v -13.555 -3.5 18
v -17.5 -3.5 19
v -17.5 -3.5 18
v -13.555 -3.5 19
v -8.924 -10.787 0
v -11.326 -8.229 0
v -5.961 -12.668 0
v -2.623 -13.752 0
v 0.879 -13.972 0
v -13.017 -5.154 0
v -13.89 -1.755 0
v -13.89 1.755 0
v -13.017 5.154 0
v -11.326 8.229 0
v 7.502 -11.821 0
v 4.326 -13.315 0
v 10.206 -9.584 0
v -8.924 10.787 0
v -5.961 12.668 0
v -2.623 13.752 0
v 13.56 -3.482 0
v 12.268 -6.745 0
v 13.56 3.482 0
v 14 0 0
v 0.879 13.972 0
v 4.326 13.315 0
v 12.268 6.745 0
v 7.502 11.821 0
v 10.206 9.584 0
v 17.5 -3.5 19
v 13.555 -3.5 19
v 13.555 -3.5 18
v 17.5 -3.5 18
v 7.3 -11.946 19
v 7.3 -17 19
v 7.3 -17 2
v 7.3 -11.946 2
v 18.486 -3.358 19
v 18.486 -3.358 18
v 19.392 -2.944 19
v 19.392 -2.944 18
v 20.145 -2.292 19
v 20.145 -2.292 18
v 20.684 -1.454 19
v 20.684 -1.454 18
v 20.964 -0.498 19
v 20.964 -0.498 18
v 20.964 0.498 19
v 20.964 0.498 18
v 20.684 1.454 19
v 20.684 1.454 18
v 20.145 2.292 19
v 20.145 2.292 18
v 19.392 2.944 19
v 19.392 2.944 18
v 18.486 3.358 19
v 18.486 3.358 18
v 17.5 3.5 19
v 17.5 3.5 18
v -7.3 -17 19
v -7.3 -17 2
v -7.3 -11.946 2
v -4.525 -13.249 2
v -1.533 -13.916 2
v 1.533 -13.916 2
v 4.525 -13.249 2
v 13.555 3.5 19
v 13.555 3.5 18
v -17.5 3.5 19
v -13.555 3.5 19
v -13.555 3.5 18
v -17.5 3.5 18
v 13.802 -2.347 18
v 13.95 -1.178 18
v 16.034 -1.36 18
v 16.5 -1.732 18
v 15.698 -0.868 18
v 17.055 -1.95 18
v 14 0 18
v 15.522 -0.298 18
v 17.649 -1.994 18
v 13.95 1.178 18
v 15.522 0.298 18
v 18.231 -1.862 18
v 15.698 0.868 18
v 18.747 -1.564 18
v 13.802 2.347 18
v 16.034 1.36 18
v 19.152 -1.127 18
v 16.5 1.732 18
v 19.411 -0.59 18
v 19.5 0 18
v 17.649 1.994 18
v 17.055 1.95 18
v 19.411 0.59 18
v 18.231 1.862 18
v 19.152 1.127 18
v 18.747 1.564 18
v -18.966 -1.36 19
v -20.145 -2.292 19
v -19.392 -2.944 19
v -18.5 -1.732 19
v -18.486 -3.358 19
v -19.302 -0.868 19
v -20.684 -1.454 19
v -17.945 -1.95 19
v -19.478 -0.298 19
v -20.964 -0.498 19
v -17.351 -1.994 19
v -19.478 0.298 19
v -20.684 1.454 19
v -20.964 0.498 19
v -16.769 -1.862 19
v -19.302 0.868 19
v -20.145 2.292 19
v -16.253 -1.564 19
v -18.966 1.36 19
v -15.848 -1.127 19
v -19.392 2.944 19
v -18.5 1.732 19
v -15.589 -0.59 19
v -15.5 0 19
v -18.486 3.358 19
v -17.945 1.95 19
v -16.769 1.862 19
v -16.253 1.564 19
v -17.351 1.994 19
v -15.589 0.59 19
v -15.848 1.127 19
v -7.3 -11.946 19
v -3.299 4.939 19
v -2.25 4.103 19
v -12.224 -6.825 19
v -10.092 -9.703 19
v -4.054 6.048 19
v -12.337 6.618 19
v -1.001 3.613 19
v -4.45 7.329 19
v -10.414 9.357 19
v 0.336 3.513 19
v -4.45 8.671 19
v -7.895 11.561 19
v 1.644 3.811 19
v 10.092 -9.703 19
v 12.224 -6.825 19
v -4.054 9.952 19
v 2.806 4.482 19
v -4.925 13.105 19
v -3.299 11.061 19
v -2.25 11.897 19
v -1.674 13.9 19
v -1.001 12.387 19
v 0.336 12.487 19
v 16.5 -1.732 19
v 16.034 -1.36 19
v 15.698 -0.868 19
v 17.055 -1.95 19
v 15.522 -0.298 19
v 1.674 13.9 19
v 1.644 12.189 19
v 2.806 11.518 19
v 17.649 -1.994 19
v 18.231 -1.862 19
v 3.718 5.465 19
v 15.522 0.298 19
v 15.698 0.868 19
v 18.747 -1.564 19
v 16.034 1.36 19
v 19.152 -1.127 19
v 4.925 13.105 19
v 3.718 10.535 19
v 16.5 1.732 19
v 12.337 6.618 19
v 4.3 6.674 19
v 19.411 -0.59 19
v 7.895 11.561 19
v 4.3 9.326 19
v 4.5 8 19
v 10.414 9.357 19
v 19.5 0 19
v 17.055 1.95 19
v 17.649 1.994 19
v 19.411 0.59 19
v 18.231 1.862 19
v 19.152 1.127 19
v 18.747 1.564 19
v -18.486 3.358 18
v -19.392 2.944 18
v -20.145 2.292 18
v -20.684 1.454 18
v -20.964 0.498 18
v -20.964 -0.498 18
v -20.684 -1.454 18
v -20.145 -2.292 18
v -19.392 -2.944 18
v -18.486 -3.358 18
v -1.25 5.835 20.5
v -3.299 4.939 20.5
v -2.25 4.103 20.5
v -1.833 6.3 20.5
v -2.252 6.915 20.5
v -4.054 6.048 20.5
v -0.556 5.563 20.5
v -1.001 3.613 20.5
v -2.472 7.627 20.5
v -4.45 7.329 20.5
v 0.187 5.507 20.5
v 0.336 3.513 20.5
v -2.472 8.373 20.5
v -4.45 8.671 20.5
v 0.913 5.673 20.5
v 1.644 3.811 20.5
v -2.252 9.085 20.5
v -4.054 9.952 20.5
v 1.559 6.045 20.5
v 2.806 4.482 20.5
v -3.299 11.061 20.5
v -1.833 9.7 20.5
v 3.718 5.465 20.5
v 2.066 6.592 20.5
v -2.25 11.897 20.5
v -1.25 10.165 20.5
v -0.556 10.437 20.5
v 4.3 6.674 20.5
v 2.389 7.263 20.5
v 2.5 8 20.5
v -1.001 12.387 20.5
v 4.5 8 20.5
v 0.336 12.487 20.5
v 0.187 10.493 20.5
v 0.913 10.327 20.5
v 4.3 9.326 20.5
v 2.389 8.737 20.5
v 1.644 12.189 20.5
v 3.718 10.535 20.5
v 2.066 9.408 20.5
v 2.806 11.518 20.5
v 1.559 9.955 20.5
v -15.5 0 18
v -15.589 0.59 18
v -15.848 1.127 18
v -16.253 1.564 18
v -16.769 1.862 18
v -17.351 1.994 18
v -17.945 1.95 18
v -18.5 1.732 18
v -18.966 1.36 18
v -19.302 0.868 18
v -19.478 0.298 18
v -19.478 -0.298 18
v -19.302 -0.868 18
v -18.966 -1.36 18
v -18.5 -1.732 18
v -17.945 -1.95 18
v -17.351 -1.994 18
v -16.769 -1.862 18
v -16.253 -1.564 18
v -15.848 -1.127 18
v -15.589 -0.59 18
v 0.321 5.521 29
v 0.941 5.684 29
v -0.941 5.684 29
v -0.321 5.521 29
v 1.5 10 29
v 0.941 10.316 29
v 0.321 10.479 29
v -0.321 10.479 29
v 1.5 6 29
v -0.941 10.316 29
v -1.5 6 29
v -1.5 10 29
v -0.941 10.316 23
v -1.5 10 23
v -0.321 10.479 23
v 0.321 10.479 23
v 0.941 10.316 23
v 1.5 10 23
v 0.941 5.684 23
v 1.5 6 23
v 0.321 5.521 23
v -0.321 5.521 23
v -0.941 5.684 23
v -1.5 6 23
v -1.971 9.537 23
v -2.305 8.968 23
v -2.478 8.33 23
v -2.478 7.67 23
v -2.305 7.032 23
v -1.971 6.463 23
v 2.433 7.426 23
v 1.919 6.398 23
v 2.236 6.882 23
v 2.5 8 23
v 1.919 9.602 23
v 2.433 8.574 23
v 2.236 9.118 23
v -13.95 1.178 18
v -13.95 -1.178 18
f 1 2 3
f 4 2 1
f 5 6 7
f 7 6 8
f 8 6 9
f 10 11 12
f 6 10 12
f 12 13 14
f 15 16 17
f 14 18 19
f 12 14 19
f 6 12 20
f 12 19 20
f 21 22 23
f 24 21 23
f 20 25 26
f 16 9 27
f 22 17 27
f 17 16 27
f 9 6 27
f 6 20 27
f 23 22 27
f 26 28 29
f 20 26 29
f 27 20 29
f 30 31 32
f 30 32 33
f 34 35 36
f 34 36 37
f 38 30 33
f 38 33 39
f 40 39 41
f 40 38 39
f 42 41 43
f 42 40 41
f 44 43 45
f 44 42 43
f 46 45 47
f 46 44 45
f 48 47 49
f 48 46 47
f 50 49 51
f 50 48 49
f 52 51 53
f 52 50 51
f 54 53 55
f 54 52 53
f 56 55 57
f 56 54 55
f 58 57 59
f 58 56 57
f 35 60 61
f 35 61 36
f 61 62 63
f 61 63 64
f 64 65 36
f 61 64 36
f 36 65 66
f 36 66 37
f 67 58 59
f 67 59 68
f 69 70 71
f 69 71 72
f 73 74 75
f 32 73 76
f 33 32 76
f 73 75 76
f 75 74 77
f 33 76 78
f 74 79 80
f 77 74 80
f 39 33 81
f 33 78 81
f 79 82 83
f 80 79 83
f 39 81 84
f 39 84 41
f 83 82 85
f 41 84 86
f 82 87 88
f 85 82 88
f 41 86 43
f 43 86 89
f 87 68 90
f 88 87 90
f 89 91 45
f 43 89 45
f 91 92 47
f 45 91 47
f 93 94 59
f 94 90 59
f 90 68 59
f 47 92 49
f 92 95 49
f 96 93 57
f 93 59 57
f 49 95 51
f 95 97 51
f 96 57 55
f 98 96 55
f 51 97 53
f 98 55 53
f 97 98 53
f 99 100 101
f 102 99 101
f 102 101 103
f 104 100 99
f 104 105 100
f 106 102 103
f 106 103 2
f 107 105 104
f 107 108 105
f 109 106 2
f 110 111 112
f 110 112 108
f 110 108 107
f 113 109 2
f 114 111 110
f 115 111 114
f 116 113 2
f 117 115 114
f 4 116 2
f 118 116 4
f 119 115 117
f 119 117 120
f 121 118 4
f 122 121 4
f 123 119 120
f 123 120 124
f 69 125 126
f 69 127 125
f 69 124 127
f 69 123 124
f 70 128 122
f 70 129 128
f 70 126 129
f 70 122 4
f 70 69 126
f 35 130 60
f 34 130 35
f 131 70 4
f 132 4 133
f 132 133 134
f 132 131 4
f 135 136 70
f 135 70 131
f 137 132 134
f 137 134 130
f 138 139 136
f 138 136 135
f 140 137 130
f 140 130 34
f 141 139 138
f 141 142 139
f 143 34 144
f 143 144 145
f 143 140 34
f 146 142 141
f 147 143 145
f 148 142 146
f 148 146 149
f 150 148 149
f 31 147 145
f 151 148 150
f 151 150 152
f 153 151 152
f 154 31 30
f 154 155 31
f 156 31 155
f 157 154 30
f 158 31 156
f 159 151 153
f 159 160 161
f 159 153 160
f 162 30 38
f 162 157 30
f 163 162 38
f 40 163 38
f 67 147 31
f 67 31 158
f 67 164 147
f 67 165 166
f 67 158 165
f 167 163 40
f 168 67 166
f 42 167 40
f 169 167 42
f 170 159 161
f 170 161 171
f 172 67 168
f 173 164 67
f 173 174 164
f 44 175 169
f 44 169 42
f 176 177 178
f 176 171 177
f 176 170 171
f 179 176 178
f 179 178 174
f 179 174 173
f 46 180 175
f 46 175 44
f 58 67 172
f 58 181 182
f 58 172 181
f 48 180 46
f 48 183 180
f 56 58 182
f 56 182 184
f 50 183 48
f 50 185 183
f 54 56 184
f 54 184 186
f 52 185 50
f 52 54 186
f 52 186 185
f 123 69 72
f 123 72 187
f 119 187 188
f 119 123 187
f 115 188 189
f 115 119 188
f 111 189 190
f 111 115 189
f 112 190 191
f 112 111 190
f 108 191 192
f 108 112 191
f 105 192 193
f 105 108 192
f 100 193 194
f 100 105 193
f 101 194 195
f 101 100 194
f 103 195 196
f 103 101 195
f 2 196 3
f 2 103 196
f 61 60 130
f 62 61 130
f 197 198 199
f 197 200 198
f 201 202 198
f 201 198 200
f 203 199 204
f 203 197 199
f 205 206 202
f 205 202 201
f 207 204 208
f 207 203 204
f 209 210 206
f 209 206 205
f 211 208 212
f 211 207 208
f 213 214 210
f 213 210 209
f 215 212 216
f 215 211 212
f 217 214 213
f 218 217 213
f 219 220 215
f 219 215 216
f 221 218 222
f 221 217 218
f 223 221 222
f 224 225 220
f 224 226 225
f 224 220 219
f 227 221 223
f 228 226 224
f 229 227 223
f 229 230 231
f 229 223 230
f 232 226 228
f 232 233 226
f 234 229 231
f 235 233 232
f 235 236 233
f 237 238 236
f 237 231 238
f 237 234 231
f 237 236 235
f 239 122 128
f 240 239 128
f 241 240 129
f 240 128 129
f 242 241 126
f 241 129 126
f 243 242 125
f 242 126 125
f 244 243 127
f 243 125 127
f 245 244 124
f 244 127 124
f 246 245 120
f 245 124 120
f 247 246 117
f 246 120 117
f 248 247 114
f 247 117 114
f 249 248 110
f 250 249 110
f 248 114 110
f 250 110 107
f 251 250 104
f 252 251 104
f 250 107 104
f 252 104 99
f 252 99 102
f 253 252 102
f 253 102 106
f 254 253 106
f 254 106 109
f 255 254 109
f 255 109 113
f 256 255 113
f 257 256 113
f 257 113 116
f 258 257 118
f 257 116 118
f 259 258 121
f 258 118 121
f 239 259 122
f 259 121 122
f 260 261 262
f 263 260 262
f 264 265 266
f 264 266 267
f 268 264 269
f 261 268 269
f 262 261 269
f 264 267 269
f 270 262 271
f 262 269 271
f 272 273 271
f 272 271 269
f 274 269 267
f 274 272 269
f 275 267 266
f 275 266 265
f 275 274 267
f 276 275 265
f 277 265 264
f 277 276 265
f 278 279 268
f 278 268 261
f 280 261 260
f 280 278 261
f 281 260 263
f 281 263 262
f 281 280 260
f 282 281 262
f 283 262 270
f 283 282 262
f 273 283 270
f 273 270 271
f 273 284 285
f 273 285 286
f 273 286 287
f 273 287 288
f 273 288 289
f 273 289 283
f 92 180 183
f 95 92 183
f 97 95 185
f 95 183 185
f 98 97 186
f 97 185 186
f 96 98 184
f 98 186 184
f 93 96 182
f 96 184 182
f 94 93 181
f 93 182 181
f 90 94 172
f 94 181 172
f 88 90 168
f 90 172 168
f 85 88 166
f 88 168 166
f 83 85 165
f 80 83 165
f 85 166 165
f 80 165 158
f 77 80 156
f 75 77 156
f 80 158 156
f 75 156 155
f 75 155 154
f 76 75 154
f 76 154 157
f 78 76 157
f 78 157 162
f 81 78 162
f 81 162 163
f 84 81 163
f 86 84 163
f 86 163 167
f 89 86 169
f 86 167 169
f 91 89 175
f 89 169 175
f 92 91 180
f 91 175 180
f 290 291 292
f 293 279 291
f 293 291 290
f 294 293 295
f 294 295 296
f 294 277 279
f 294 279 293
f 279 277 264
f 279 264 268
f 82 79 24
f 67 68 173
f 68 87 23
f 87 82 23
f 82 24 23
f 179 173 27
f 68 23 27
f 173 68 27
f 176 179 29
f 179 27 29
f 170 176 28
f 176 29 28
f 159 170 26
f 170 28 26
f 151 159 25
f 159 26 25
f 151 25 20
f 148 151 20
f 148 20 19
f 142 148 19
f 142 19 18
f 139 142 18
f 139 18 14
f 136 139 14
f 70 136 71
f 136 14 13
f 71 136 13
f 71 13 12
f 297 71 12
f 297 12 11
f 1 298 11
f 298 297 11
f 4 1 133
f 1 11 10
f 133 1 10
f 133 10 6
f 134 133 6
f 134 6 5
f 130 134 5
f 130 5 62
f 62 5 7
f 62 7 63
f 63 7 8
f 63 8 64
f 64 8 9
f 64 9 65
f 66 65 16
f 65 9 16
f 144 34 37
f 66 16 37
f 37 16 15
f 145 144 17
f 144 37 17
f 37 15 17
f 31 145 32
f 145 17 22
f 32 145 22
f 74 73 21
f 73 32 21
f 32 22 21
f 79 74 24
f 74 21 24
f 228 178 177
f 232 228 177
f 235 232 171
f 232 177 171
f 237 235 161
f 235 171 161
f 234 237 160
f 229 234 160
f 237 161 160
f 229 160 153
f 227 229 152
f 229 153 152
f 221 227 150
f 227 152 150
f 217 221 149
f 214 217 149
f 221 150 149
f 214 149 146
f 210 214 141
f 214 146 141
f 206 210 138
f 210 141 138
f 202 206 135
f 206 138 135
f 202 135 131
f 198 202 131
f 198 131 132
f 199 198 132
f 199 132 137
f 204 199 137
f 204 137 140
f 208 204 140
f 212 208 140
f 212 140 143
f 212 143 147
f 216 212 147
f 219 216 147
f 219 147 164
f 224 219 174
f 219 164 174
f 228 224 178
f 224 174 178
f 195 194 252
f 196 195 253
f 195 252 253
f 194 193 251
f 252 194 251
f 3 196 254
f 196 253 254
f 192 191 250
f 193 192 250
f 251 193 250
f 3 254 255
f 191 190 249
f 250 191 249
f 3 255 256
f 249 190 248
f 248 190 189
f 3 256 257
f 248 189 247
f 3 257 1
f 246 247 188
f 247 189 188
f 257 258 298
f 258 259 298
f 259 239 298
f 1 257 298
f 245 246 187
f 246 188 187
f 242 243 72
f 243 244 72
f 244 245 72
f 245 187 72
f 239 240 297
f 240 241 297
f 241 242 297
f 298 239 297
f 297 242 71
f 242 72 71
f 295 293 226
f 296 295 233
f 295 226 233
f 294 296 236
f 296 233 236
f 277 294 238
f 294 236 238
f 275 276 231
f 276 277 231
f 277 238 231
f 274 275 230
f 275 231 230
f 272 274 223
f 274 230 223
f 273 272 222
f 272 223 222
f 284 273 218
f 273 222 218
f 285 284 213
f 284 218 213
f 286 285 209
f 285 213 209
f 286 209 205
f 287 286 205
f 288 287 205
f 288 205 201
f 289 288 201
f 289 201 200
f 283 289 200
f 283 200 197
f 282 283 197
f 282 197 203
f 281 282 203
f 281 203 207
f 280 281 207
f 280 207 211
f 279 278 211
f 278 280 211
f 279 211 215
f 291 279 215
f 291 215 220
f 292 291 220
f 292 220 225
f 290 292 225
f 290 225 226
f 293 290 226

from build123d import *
from build123d.topology import SkipClean

# Parameters (mm, degrees)
SKETCH2_R           = 14
BOSS_EXTRUDE2_DEPTH = 19
SKETCH3_R           = 4.5
BOSS_EXTRUDE3_DEPTH = 1.5
SKETCH4_R           = 2.5
BOSS_EXTRUDE4_DEPTH = 2.5
SKETCH5_R           = 2
BOSS_EXTRUDE5_DEPTH = 1
SKETCH6_W           = 14.6
SKETCH6_H           = 9.231468238
BOSS_EXTRUDE6_DEPTH = 17
BOSS_EXTRUDE7_DEPTH = 6


with BuildPart() as part:
    # Sketch2 → Boss-Extrude2 (new body)
    with BuildSketch(Plane.XY):
        Circle(SKETCH2_R)
    extrude(amount=BOSS_EXTRUDE2_DEPTH)

    # Sketch3 → Boss-Extrude3 (add)
    with BuildSketch(Plane.XY.offset(19)):
        with Locations((0, 8)):
            Circle(SKETCH3_R)
    extrude(amount=BOSS_EXTRUDE3_DEPTH)

    # Sketch4 → Boss-Extrude4 (add)
    with BuildSketch(Plane.XY.offset(20.5)):
        with Locations((0, 8)):
            Circle(SKETCH4_R)
    extrude(amount=BOSS_EXTRUDE4_DEPTH)

    # Sketch5 → Boss-Extrude5 (add)
    with BuildSketch(Plane.XY.offset(19)):
        with BuildLine():
            ThreePointArc((17.5, -3.5), (21, 0), (17.5, 3.5))
            Line((17.5, 3.5), (13.555441712, 3.5))
            ThreePointArc((13.555441712, 3.5), (13.888415748, 1.764060095), (14, 0))
            ThreePointArc((14, 0), (13.888415748, -1.764060095), (13.555441712, -3.5))
            Line((13.555441712, -3.5), (17.5, -3.5))
        make_face()
        with Locations((17.5, 0)):
            Circle(SKETCH5_R, mode=Mode.SUBTRACT)
        with BuildLine():
            ThreePointArc((-13.555441712, -3.5), (-14, 0), (-13.555441712, 3.5))
            Line((-13.555441712, 3.5), (-17.5, 3.5))
            ThreePointArc((-17.5, 3.5), (-21, 0), (-17.5, -3.5))
            Line((-17.5, -3.5), (-13.555441712, -3.5))
        make_face()
        with Locations((-17.5, 0)):
            Circle(SKETCH5_R, mode=Mode.SUBTRACT)
    extrude(amount=-BOSS_EXTRUDE5_DEPTH)

    # Sketch6 → Boss-Extrude6 (add)
    with BuildSketch(Plane.XY.offset(19)):
        with Locations((0, -12.384265881)):
            Rectangle(SKETCH6_W, SKETCH6_H)
    extrude(amount=-BOSS_EXTRUDE6_DEPTH)

    # Sketch7 → Boss-Extrude7 (add)
    with SkipClean():  # the faces are left unmerged after this step: merging them gives an invalid solid
        with BuildSketch(Plane.XY.offset(23)):
            with BuildLine():
                Line((-1.5, 6), (-1.5, 10))
                ThreePointArc((-1.5, 10), (0, 10.5), (1.5, 10))
                Line((1.5, 10), (1.5, 6))
                ThreePointArc((1.5, 6), (0, 5.5), (-1.5, 6))
            make_face()
        extrude(amount=BOSS_EXTRUDE7_DEPTH)


solid = part.part
